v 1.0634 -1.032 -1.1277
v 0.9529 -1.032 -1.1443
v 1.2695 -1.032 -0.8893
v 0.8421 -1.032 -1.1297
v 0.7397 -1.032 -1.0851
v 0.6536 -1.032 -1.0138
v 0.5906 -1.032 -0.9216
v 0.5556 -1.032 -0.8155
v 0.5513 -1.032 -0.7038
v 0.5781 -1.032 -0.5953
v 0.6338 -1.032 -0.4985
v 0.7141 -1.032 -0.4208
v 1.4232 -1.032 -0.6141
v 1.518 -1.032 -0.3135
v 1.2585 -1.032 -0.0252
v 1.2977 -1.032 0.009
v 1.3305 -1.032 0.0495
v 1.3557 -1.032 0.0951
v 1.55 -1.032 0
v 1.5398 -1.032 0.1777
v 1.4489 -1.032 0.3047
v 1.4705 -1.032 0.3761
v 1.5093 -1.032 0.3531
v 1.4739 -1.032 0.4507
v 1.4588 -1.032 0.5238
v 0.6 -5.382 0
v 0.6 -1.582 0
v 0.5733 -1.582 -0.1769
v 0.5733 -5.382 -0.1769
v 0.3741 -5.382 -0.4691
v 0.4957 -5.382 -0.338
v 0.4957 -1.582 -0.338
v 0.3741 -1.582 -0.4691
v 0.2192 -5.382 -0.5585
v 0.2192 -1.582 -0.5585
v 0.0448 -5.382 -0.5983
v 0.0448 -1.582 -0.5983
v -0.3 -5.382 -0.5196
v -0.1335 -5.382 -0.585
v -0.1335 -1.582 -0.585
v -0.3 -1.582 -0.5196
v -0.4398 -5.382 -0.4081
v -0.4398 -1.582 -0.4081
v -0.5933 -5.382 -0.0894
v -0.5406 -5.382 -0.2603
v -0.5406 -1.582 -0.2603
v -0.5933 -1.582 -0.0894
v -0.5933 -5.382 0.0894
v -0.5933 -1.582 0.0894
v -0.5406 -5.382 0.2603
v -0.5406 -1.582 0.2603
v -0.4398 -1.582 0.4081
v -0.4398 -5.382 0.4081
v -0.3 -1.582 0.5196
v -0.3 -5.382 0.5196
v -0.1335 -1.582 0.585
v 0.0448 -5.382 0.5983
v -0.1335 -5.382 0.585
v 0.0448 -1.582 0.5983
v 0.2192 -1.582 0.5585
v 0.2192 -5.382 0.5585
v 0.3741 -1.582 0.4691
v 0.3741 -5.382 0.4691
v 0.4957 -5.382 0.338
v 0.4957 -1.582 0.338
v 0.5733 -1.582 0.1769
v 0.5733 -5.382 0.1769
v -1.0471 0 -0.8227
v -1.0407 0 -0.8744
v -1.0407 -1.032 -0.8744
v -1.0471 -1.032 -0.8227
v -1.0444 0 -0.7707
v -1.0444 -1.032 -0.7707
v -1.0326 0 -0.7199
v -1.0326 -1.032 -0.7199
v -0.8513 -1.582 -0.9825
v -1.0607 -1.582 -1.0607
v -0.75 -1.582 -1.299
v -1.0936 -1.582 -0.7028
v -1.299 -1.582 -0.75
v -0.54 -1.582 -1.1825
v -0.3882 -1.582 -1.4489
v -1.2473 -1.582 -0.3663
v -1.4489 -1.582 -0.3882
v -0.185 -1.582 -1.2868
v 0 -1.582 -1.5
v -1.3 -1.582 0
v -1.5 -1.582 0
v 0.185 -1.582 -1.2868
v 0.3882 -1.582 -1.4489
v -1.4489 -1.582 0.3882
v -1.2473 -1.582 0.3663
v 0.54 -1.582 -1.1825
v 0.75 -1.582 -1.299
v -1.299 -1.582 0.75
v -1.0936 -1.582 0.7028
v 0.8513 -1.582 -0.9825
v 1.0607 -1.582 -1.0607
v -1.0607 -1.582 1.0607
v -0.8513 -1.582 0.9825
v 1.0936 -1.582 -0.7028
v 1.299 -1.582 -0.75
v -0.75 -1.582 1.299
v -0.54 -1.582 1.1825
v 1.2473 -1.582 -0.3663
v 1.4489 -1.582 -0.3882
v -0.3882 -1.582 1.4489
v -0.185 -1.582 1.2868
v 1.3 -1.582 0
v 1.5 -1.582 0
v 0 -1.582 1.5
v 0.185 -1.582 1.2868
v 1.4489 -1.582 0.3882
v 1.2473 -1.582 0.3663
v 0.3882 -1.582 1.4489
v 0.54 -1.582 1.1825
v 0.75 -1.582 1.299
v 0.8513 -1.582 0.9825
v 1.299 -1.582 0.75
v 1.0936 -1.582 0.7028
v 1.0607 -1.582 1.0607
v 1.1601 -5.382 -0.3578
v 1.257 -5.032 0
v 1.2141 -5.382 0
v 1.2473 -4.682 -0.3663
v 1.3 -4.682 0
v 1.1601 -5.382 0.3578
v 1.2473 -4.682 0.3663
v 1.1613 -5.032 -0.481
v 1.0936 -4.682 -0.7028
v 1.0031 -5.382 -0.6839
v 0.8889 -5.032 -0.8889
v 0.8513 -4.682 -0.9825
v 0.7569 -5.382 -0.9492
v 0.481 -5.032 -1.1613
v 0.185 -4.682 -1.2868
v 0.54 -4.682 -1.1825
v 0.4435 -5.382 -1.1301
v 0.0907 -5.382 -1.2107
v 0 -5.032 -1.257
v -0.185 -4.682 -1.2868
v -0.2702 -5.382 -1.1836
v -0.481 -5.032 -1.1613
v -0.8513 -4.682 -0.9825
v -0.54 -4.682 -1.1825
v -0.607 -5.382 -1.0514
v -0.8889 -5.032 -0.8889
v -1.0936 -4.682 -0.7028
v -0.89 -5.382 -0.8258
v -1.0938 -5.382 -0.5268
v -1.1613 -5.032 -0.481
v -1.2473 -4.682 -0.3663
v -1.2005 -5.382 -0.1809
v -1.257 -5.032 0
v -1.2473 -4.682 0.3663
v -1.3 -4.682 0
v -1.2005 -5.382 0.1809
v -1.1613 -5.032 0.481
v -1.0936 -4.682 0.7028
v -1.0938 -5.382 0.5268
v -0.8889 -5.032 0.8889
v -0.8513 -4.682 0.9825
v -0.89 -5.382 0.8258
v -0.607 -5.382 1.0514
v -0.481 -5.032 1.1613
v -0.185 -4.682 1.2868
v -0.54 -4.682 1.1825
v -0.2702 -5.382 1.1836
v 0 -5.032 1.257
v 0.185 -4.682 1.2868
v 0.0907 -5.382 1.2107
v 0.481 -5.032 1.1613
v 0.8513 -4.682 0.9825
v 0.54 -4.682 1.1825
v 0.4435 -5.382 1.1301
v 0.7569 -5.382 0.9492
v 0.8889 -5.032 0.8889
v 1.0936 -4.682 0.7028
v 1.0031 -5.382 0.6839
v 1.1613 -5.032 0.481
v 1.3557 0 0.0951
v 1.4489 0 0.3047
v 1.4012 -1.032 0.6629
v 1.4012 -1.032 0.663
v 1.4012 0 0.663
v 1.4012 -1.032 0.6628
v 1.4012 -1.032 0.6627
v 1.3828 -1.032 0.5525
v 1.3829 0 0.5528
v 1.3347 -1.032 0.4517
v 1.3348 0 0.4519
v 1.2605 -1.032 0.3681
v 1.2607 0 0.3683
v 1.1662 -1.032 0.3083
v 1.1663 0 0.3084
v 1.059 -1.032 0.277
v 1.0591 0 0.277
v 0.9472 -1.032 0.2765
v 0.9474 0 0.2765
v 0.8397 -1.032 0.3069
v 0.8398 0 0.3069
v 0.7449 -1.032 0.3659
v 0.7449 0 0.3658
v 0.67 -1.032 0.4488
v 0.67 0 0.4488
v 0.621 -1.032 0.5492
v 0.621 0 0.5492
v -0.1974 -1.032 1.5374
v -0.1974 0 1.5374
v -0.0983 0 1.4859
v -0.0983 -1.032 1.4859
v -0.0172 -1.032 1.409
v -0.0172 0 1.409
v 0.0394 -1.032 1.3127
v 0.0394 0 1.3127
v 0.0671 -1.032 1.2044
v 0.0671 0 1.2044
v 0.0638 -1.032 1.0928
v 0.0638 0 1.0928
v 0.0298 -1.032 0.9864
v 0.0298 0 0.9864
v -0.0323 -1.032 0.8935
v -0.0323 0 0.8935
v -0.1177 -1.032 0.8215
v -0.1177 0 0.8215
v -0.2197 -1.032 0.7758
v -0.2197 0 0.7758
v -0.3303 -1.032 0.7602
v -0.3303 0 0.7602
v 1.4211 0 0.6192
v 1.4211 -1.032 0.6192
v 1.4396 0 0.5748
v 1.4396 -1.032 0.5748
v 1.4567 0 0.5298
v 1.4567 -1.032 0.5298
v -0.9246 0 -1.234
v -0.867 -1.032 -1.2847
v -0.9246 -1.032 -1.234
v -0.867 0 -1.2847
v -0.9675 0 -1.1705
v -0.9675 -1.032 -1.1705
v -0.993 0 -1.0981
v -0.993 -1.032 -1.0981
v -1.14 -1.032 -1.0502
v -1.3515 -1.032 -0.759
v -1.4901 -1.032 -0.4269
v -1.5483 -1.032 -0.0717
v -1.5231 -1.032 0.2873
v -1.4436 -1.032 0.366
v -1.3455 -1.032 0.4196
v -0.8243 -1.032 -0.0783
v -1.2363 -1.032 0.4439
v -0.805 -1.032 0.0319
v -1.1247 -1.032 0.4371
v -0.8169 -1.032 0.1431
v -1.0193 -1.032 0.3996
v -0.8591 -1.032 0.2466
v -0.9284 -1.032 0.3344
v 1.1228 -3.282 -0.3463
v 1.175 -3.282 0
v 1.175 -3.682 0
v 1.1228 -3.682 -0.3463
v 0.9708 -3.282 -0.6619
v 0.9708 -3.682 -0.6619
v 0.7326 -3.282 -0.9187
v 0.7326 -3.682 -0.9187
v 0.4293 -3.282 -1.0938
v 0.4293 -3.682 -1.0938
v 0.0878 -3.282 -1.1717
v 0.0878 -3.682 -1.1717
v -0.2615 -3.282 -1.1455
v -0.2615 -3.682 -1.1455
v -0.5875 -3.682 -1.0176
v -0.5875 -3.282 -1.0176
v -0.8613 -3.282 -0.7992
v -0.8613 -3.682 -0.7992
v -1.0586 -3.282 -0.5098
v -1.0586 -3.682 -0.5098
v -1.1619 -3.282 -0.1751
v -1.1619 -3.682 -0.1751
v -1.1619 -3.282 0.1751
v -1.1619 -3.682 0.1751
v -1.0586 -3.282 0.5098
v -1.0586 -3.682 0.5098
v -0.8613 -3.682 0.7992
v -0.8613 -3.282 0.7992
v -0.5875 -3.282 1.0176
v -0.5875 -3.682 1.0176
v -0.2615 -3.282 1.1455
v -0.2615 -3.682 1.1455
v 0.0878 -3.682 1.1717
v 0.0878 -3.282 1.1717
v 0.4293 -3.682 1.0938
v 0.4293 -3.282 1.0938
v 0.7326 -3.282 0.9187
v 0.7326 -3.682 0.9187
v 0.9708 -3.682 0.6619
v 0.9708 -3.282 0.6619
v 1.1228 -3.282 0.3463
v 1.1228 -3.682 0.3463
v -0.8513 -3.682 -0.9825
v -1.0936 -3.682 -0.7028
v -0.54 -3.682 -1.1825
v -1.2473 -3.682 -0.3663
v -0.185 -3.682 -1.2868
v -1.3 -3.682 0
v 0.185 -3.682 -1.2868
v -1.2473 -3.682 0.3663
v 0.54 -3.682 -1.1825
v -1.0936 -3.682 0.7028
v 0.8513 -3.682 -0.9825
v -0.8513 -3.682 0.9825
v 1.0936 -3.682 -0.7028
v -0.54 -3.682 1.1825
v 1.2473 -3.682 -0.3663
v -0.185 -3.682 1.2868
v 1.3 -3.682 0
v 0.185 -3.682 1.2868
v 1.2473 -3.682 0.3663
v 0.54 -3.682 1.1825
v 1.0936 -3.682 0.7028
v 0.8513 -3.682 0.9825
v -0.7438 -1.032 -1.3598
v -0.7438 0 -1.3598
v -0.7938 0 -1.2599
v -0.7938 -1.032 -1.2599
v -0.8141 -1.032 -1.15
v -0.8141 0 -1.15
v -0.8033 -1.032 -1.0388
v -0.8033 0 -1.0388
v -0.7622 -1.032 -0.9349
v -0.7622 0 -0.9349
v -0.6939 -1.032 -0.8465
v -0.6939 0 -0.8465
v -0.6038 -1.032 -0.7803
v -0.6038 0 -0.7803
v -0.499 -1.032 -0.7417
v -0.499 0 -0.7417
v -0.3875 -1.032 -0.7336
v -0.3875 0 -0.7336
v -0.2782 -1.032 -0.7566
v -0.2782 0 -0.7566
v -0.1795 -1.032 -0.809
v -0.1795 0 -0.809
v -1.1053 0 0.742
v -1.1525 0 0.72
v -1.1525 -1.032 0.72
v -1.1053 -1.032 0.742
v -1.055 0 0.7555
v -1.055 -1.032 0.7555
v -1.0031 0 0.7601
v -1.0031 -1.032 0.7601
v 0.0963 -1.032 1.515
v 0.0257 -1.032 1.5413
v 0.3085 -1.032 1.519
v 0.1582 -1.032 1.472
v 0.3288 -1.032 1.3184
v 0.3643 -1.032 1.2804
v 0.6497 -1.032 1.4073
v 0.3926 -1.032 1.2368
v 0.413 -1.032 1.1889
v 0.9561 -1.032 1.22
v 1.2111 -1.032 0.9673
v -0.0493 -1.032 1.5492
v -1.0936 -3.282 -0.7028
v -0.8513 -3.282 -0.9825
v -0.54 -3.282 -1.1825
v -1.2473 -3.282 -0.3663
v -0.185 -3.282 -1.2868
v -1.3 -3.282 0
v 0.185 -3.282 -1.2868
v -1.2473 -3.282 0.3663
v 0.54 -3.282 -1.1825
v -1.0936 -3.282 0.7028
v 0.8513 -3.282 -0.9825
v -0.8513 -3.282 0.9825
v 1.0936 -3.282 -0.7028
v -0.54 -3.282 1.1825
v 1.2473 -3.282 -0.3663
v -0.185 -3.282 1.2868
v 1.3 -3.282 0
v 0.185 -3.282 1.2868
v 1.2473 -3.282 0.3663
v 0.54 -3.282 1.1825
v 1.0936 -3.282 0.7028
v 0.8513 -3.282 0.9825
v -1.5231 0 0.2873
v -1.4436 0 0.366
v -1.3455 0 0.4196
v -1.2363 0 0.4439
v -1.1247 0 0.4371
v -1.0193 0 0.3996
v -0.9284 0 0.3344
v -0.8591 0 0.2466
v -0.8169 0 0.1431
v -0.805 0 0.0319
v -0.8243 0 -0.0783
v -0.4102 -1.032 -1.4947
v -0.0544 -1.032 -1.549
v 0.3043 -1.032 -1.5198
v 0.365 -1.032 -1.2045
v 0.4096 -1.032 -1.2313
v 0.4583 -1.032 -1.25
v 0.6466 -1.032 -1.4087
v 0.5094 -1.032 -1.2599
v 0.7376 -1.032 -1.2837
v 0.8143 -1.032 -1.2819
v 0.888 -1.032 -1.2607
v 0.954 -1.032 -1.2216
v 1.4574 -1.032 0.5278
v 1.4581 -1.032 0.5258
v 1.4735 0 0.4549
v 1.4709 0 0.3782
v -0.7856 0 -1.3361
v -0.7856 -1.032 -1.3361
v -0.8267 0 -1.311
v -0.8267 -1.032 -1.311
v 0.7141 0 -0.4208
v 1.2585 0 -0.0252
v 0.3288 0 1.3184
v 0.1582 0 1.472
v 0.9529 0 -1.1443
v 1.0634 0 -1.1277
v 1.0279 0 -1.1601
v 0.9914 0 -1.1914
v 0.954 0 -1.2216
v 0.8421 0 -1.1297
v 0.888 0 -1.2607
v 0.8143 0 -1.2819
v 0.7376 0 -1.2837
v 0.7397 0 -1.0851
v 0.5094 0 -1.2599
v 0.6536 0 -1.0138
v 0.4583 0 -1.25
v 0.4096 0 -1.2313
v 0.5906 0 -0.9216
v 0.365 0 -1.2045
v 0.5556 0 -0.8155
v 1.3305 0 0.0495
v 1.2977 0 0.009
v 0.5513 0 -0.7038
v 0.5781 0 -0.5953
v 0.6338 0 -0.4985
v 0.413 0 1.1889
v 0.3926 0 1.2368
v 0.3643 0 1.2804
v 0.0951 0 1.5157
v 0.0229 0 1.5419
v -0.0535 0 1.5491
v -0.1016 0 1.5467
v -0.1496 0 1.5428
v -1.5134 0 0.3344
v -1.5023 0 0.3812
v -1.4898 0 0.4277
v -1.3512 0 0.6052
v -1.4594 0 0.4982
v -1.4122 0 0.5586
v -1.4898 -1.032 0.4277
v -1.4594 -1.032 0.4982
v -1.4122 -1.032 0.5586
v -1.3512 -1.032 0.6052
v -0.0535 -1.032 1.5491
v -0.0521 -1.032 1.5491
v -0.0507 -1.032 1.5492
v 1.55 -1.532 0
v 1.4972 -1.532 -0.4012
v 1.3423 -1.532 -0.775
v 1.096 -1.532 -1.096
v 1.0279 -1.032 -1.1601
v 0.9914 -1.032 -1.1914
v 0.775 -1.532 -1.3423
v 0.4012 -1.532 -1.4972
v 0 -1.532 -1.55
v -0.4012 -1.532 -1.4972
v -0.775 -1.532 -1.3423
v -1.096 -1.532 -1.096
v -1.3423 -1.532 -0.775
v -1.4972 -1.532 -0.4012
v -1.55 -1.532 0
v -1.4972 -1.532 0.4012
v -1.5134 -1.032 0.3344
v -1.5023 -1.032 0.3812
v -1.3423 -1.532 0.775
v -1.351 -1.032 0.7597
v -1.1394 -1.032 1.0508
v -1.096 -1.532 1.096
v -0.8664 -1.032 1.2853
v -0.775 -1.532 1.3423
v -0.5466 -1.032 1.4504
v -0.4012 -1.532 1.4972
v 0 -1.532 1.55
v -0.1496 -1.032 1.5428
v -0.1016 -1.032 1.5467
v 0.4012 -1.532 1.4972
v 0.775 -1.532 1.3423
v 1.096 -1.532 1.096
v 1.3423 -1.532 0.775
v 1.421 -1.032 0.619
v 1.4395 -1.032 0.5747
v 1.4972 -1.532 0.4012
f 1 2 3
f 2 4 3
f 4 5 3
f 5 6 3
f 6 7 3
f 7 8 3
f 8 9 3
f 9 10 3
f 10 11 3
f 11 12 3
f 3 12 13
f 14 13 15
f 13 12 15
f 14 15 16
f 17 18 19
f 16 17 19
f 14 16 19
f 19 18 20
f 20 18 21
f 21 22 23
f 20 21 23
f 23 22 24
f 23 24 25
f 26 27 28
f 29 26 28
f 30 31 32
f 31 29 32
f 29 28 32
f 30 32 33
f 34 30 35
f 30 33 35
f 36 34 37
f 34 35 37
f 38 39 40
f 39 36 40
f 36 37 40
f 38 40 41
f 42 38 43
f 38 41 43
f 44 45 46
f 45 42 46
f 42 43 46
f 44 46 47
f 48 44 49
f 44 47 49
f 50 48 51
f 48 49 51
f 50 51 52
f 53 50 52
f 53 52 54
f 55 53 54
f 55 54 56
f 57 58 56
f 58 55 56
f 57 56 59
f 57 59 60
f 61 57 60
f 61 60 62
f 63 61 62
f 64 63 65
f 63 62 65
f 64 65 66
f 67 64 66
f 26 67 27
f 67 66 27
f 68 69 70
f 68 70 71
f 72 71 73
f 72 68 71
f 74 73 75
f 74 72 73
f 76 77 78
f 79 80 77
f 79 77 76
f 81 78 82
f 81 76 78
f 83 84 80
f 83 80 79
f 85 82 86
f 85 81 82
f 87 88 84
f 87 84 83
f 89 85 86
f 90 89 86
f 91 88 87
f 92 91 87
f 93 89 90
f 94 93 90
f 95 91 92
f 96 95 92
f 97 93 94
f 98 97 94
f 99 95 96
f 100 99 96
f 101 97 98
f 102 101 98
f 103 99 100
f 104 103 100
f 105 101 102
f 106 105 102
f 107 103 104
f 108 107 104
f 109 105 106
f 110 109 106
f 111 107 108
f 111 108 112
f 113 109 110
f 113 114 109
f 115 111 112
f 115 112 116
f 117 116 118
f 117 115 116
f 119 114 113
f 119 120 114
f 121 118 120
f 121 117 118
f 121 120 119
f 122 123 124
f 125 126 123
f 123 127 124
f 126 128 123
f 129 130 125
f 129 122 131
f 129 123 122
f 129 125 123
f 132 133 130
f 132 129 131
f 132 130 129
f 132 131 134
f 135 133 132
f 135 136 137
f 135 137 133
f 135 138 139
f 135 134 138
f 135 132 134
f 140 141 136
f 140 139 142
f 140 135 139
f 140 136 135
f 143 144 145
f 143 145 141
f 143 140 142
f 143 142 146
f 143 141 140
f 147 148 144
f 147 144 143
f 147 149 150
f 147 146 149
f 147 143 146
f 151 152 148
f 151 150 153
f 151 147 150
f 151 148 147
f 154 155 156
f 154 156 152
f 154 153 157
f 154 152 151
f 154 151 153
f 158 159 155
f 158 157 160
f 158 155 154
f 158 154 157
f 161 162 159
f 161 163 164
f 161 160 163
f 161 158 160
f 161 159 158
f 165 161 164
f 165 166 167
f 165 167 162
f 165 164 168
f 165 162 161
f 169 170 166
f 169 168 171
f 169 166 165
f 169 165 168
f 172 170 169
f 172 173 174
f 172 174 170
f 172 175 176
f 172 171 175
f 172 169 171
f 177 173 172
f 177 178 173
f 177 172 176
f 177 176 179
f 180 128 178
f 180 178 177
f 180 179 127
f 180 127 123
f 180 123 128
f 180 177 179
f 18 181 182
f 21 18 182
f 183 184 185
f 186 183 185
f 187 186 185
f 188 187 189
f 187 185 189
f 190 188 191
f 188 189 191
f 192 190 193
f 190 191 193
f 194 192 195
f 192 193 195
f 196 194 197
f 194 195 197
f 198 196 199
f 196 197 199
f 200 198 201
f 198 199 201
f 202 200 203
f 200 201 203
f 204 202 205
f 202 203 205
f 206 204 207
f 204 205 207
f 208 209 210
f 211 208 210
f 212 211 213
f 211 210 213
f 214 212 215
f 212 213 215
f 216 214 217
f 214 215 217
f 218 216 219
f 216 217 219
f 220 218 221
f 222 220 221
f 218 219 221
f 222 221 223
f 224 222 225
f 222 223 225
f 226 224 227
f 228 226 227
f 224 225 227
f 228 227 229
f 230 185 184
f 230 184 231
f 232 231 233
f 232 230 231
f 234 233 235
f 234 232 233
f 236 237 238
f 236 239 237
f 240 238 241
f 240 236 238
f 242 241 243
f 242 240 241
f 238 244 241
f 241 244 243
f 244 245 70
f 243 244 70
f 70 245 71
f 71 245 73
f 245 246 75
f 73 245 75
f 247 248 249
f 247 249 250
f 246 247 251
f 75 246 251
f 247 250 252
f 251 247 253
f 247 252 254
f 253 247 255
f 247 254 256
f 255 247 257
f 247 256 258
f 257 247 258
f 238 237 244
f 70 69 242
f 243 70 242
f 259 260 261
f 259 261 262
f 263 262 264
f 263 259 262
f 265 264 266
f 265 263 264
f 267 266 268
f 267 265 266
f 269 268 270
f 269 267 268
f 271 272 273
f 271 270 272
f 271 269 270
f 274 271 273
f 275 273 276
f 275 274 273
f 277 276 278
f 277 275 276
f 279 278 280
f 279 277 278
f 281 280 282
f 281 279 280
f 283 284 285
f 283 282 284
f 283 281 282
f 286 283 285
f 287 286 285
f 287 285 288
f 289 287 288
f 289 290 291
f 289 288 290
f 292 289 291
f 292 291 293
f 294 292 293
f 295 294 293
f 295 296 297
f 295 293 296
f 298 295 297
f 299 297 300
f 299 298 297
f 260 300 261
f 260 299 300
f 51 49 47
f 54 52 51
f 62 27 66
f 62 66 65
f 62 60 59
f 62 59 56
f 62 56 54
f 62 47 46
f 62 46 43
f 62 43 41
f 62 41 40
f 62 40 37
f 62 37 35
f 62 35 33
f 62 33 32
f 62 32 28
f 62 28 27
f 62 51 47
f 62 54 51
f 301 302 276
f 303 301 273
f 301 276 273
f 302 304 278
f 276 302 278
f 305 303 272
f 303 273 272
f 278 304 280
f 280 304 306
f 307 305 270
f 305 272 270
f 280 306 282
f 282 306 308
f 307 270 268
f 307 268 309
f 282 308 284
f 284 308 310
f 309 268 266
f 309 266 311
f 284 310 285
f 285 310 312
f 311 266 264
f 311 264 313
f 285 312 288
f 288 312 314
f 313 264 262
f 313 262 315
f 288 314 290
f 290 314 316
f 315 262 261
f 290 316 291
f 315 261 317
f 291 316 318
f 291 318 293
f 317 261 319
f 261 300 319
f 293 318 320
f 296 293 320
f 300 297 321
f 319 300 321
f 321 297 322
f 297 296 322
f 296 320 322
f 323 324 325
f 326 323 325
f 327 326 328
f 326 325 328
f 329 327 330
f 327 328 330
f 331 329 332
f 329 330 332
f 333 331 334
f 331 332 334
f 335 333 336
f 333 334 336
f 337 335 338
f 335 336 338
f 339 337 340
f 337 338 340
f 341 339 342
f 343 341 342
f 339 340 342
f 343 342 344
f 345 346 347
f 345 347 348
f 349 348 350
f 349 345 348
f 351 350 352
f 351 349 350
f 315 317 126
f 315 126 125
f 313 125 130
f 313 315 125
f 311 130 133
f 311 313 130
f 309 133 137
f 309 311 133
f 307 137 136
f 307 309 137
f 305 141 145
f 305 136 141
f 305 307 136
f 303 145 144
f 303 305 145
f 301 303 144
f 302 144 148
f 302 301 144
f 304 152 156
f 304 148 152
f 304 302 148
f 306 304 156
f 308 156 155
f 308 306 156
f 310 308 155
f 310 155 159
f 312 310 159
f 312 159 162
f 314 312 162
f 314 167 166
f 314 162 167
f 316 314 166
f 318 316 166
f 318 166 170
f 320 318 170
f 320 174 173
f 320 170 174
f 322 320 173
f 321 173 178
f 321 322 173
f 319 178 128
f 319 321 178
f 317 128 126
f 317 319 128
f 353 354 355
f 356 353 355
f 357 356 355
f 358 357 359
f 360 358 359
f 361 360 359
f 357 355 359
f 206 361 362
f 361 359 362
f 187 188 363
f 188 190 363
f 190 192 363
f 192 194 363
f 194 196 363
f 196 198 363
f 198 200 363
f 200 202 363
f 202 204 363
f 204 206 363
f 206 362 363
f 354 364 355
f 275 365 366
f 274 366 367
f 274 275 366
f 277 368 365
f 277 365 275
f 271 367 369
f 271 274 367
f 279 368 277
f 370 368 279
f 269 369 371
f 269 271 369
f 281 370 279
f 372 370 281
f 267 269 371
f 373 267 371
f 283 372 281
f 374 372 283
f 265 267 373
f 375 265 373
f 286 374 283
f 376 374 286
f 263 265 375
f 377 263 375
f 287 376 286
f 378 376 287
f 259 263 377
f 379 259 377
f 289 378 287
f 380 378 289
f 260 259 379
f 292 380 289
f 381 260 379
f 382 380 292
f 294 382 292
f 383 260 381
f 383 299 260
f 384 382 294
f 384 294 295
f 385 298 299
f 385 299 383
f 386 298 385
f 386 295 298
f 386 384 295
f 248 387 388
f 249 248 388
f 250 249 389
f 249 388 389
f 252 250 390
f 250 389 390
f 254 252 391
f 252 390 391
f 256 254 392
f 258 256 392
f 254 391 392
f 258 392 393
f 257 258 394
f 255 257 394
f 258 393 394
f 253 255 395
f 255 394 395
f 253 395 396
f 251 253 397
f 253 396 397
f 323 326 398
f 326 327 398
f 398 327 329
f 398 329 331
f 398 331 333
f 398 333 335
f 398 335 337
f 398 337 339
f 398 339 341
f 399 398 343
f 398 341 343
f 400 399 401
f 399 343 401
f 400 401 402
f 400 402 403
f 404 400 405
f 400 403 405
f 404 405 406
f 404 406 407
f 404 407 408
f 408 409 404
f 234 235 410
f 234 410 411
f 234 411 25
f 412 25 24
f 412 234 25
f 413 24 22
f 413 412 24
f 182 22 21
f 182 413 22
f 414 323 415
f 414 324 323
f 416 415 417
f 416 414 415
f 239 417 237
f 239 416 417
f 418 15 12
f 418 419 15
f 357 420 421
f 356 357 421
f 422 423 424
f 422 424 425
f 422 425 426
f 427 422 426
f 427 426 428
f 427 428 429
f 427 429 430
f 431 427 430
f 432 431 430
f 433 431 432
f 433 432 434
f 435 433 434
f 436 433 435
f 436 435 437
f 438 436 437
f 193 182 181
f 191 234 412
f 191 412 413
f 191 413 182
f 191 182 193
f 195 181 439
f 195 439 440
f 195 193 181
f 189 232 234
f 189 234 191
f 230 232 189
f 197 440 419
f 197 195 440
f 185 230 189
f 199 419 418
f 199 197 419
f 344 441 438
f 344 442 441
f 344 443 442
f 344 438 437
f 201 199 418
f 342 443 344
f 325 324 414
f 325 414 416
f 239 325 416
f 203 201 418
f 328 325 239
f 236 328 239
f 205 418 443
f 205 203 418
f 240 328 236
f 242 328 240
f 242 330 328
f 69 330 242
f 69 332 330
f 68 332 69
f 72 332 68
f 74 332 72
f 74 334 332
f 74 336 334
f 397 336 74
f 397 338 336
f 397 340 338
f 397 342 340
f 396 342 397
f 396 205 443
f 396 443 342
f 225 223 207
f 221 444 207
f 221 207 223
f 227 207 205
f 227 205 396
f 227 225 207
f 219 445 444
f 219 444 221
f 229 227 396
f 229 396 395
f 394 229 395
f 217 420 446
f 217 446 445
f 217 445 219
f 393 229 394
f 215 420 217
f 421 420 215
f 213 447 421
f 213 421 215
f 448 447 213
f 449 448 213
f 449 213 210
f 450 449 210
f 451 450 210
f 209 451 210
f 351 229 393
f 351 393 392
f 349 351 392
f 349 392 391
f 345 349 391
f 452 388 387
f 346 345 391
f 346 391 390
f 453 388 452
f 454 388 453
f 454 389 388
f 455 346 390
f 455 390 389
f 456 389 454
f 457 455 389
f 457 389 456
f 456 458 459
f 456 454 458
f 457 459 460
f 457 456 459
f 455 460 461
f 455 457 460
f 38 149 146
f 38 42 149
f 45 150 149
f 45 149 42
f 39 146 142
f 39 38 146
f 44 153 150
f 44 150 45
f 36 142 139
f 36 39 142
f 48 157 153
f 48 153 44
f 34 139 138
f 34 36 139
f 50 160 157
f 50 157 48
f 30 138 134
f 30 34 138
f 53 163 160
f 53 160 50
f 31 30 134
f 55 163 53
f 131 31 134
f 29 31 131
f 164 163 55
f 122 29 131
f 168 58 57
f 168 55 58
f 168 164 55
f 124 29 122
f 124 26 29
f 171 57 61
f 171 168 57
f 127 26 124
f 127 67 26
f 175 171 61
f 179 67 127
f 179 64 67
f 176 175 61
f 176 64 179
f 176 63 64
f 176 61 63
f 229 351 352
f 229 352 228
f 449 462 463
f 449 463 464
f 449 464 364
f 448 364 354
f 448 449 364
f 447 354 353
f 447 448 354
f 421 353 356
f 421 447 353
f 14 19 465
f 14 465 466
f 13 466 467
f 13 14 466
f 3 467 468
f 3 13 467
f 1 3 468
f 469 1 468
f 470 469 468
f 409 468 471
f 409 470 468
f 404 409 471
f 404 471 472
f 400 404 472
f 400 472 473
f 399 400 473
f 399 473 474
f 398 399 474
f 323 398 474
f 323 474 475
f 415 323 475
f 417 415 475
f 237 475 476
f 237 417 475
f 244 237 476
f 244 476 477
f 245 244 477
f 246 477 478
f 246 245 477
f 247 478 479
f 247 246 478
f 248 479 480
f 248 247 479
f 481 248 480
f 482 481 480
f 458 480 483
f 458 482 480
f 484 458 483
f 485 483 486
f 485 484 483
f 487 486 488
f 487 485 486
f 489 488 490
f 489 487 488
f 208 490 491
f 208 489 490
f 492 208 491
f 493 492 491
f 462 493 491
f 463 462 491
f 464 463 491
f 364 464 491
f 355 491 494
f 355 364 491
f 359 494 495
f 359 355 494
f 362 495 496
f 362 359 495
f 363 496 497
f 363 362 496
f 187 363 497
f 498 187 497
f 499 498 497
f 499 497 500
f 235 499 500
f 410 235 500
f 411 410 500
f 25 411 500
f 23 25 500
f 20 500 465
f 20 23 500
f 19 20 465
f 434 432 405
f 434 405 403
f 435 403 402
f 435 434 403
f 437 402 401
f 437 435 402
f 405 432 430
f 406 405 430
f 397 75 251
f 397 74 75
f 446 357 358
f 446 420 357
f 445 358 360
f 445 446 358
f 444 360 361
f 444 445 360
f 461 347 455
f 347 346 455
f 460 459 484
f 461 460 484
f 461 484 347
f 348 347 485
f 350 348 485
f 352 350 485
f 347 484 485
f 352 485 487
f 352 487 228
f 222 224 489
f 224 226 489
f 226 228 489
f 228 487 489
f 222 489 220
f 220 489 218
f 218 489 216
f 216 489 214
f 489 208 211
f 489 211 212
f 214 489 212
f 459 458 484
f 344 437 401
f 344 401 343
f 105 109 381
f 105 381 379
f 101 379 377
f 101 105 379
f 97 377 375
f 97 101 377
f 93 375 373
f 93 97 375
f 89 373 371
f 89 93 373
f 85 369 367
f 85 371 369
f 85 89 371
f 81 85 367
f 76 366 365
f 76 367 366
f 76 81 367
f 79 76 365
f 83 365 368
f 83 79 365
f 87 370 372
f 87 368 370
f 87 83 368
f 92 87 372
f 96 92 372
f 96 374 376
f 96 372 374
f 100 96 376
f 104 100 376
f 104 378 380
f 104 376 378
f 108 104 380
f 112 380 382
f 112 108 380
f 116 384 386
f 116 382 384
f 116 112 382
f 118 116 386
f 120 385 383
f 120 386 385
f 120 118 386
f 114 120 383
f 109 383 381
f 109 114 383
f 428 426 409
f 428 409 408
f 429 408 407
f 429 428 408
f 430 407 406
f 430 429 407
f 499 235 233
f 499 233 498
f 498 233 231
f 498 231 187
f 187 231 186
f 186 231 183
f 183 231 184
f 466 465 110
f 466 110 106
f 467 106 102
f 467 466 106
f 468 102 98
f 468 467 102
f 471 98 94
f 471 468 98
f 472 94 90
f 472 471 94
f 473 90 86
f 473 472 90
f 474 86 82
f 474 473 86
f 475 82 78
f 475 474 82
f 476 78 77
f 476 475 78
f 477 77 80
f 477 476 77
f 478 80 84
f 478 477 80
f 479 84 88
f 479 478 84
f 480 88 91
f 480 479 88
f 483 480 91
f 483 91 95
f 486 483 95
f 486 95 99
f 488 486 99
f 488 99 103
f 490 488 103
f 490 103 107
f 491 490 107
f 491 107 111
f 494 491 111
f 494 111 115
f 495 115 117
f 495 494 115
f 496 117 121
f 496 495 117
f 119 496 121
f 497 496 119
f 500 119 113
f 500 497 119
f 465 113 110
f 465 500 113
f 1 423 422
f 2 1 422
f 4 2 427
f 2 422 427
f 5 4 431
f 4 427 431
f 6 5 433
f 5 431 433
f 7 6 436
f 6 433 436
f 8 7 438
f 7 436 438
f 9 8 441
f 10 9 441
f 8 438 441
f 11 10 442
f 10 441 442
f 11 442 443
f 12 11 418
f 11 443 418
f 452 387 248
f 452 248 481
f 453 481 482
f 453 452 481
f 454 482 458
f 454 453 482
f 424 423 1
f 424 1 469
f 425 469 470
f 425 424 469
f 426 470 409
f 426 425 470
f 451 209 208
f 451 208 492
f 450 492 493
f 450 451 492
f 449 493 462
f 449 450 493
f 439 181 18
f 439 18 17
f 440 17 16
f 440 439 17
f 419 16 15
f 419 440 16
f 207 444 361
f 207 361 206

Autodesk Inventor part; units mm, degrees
ref_plane "YZ Plane" through (0, 0, 0) normal (1, 0, 0) x (0, 1, 0)
sketch "Sketch2" plane through (0, 0, 0) normal (0, 1, 0) x (-1, 0, 0)
  line L0 (-0.3288, 1.3184) -> (-0.1582, 1.472)
  line L1 (-0.3288, 1.3184) -> (-0.1582, 1.472)
  line L2 (-0.5094, -1.2599) -> (-0.7376, -1.2837)
  arc A0 (0.7438, -1.3598) -> (0.1795, -0.809) centre (0.4146, -1.1327) ccw
  line L3 (-0.365, -1.2045) -> (0.1795, -0.809)
  arc A1 (-1.0634, -1.1277) -> (-0.954, -1.2216) centre (-0.0001, 0.0001) ccw
  line L4 (-0.365, -1.2045) -> (0.1795, -0.809)
  arc A2 (-0.5094, -1.2599) -> (-0.365, -1.2045) centre (-0.5404, -0.963) ccw
  line L5 (1.1525, 0.72) -> (1.3512, 0.6052)
  arc A3 (0.1974, 1.5374) -> (0.3303, 0.7602) centre (0.3304, 1.1602) ccw
  line L6 (1.0031, 0.7601) -> (0.3303, 0.7602)
  arc A4 (1.1525, 0.72) -> (1.0031, 0.7601) centre (1.0031, 0.4616) ccw
  line L7 (1.0407, -0.8744) -> (0.993, -1.0981)
  arc A5 (1.5231, 0.2873) -> (0.8243, -0.0783) centre (1.2047, 0.0452) ccw
  line L8 (1.0326, -0.7199) -> (0.8243, -0.0783)
  arc A6 (1.0407, -0.8744) -> (1.0326, -0.7199) centre (0.7487, -0.8121) ccw
  arc A7 (-1.4012, 0.663) -> (-0.621, 0.5492) centre (-1.0013, 0.6728) ccw
  line L9 (-0.413, 1.1889) -> (-0.621, 0.5492)
  arc A8 (-0.3288, 1.3184) -> (-0.413, 1.1889) centre (-0.1291, 1.0966) ccw
  line L10 (-1.3557, 0.0951) -> (-1.4489, 0.3047)
  arc A9 (-1.0634, -1.1277) -> (-0.7141, -0.4208) centre (-0.9492, -0.7444) ccw
  line L11 (-1.2585, -0.0252) -> (-0.7141, -0.4208)
  arc A10 (-1.3557, 0.0951) -> (-1.2585, -0.0252) centre (-1.083, 0.2163) ccw
  arc A11 (1.5231, 0.2872) -> (1.4898, 0.4277) centre (-0.0001, 0.0001) ccw
  arc A12 (-1.4012, 0.663) -> (-1.4567, 0.5298) centre (-0.0001, 0.0001) ccw
  arc A13 (0.7438, -1.3598) -> (0.867, -1.2847) centre (-0.0001, 0.0001) ccw
  arc A14 (0.1974, 1.5374) -> (0.0535, 1.5491) centre (-0.0001, 0.0001) ccw
  arc A15 (0.0535, 1.5491) -> (-0.1582, 1.472) centre (0.0431, 1.2484) ccw
  arc A16 (-1.4567, 0.5298) -> (-1.4489, 0.3047) centre (-1.174, 0.4269) ccw
  arc A17 (1.4898, 0.4277) -> (1.3512, 0.6052) centre (1.2005, 0.3447) ccw
  arc A18 (-0.954, -1.2216) -> (-0.7376, -1.2837) centre (-0.7688, -0.9844) ccw
  arc A19 (0.867, -1.2847) -> (0.993, -1.0981) centre (0.6987, -1.0353) ccw
  circle A20 centre (-0.0001, 0.0001) radius 1.55
  point P0 (-1.356, 0.0956)
  point P1 (1.0033, 0.76)
  point P2 (0.3301, 0.76)
  dimension "d305" = 3.1
sketch "Sketch3" plane through (0, 0, 0) normal (0, 1, 0) x (-1, 0, 0)
  line L0 (5.0133, 39.043) -> (38.6813, 7.297)
  line L1 (38.6813, 7.297) -> (18.893, -34.5332)
  line L2 (18.893, -34.5332) -> (-27.0048, -28.6397)
  line L3 (-27.0048, -28.6397) -> (-35.5829, 16.8329)
  line L4 (-35.5829, 16.8329) -> (5.0133, 39.043)
  circle A0 centre (0, 0) radius 39.3635
  circle A1 centre (0, 0) radius 20.4353
  circle A2 centre (0, 0) radius 31.8458
  circle A3 centre (10.4717, -28.7325) radius 10.093
  circle A4 centre (41.1153, -0.5956) radius 4.0726
  circle A5 centre (8.144, 29.3283) radius 10.0252
  circle A6 centre (-25.3778, 16.9956) radius 10.0583
  circle A7 centre (-24.1576, -18.872) radius 10.1582
  line L5 (-25.3778, 16.9956) -> (8.3216, 29.3877)
  line L6 (8.3216, 29.3877) -> (30.5209, 1.1669)
  line L7 (30.5209, 1.1669) -> (10.5413, -28.6665)
  line L8 (10.5413, -28.6665) -> (-24.006, -18.8838)
  line L9 (-24.006, -18.8838) -> (-25.3778, 16.9956)
  line L10 (-31.306, -23.8626) -> (-32.3687, 22.3998)
  line L11 (-32.3687, 22.3998) -> (11.301, 37.7064)
  line L12 (11.301, 37.7064) -> (39.3531, 0.904)
  line L13 (39.3531, 0.904) -> (13.0206, -37.1477)
  line L14 (13.0206, -37.1477) -> (-31.306, -23.8626)
  point P0 (-9.1427, -30.5051)
extrude "Extrusion4" add sketch "Sketch2" against normal blind 1.032 contours L0 A15 A14 A3 L6 A4 L5 A17 A11 A5 L8 A6 L7 A19 A13 A0 L3 A2 L2 A18 A1 A9 L11 A10 L10 A16 A12 A7 L9 A8
sketch "Sketch6" plane through (0, -1.032, 0) normal (0, -1, 0) x (1, 0, 0)
  circle A0 centre (0, 0) radius 1.55
  dimension "d304" = 3.1
extrude "Extrusion5" add sketch "Sketch6" along normal blind 0.55
ref_plane "Plan de construction1" through (0, -1.582, 0) normal (0, -1, 0) x (1, 0, 0)
sketch "Sketch7" plane through (0, -1.582, 0) normal (0, -1, 0) x (1, 0, 0)
  circle A0 centre (0, 0) radius 1.3
  circle A1 centre (0, 0) radius 0.6
  circle A2 centre (0, 0) radius 1.175
  dimension "d303" = 2.6
  dimension "d306" = 1.2
  dimension "d307" = 2.35
extrude "Extrusion6" add sketch "Sketch7" along normal blind 3.8 contours A0 | A2
ref_plane "Plan de construction2" through (0, -3.282, 0) normal (0, -1, 0) x (1, 0, 0)
extrude "Extrusion7" cut sketch "Sketch7" along normal blind 0.4 from surface at 1.7 contours A0
chamfer "Chanfrein2" distance 0.7 angle 7 1 edges at (-1.3, -5.382, 0) measured on face at (1.2958, -4.8153, -0.1046)
chamfer "Chanfrein3" distance 0.05 angle 45 1 edges at (-1.55, -1.582, 0)
properties part number "3.2mm_uncorrected_thin"
